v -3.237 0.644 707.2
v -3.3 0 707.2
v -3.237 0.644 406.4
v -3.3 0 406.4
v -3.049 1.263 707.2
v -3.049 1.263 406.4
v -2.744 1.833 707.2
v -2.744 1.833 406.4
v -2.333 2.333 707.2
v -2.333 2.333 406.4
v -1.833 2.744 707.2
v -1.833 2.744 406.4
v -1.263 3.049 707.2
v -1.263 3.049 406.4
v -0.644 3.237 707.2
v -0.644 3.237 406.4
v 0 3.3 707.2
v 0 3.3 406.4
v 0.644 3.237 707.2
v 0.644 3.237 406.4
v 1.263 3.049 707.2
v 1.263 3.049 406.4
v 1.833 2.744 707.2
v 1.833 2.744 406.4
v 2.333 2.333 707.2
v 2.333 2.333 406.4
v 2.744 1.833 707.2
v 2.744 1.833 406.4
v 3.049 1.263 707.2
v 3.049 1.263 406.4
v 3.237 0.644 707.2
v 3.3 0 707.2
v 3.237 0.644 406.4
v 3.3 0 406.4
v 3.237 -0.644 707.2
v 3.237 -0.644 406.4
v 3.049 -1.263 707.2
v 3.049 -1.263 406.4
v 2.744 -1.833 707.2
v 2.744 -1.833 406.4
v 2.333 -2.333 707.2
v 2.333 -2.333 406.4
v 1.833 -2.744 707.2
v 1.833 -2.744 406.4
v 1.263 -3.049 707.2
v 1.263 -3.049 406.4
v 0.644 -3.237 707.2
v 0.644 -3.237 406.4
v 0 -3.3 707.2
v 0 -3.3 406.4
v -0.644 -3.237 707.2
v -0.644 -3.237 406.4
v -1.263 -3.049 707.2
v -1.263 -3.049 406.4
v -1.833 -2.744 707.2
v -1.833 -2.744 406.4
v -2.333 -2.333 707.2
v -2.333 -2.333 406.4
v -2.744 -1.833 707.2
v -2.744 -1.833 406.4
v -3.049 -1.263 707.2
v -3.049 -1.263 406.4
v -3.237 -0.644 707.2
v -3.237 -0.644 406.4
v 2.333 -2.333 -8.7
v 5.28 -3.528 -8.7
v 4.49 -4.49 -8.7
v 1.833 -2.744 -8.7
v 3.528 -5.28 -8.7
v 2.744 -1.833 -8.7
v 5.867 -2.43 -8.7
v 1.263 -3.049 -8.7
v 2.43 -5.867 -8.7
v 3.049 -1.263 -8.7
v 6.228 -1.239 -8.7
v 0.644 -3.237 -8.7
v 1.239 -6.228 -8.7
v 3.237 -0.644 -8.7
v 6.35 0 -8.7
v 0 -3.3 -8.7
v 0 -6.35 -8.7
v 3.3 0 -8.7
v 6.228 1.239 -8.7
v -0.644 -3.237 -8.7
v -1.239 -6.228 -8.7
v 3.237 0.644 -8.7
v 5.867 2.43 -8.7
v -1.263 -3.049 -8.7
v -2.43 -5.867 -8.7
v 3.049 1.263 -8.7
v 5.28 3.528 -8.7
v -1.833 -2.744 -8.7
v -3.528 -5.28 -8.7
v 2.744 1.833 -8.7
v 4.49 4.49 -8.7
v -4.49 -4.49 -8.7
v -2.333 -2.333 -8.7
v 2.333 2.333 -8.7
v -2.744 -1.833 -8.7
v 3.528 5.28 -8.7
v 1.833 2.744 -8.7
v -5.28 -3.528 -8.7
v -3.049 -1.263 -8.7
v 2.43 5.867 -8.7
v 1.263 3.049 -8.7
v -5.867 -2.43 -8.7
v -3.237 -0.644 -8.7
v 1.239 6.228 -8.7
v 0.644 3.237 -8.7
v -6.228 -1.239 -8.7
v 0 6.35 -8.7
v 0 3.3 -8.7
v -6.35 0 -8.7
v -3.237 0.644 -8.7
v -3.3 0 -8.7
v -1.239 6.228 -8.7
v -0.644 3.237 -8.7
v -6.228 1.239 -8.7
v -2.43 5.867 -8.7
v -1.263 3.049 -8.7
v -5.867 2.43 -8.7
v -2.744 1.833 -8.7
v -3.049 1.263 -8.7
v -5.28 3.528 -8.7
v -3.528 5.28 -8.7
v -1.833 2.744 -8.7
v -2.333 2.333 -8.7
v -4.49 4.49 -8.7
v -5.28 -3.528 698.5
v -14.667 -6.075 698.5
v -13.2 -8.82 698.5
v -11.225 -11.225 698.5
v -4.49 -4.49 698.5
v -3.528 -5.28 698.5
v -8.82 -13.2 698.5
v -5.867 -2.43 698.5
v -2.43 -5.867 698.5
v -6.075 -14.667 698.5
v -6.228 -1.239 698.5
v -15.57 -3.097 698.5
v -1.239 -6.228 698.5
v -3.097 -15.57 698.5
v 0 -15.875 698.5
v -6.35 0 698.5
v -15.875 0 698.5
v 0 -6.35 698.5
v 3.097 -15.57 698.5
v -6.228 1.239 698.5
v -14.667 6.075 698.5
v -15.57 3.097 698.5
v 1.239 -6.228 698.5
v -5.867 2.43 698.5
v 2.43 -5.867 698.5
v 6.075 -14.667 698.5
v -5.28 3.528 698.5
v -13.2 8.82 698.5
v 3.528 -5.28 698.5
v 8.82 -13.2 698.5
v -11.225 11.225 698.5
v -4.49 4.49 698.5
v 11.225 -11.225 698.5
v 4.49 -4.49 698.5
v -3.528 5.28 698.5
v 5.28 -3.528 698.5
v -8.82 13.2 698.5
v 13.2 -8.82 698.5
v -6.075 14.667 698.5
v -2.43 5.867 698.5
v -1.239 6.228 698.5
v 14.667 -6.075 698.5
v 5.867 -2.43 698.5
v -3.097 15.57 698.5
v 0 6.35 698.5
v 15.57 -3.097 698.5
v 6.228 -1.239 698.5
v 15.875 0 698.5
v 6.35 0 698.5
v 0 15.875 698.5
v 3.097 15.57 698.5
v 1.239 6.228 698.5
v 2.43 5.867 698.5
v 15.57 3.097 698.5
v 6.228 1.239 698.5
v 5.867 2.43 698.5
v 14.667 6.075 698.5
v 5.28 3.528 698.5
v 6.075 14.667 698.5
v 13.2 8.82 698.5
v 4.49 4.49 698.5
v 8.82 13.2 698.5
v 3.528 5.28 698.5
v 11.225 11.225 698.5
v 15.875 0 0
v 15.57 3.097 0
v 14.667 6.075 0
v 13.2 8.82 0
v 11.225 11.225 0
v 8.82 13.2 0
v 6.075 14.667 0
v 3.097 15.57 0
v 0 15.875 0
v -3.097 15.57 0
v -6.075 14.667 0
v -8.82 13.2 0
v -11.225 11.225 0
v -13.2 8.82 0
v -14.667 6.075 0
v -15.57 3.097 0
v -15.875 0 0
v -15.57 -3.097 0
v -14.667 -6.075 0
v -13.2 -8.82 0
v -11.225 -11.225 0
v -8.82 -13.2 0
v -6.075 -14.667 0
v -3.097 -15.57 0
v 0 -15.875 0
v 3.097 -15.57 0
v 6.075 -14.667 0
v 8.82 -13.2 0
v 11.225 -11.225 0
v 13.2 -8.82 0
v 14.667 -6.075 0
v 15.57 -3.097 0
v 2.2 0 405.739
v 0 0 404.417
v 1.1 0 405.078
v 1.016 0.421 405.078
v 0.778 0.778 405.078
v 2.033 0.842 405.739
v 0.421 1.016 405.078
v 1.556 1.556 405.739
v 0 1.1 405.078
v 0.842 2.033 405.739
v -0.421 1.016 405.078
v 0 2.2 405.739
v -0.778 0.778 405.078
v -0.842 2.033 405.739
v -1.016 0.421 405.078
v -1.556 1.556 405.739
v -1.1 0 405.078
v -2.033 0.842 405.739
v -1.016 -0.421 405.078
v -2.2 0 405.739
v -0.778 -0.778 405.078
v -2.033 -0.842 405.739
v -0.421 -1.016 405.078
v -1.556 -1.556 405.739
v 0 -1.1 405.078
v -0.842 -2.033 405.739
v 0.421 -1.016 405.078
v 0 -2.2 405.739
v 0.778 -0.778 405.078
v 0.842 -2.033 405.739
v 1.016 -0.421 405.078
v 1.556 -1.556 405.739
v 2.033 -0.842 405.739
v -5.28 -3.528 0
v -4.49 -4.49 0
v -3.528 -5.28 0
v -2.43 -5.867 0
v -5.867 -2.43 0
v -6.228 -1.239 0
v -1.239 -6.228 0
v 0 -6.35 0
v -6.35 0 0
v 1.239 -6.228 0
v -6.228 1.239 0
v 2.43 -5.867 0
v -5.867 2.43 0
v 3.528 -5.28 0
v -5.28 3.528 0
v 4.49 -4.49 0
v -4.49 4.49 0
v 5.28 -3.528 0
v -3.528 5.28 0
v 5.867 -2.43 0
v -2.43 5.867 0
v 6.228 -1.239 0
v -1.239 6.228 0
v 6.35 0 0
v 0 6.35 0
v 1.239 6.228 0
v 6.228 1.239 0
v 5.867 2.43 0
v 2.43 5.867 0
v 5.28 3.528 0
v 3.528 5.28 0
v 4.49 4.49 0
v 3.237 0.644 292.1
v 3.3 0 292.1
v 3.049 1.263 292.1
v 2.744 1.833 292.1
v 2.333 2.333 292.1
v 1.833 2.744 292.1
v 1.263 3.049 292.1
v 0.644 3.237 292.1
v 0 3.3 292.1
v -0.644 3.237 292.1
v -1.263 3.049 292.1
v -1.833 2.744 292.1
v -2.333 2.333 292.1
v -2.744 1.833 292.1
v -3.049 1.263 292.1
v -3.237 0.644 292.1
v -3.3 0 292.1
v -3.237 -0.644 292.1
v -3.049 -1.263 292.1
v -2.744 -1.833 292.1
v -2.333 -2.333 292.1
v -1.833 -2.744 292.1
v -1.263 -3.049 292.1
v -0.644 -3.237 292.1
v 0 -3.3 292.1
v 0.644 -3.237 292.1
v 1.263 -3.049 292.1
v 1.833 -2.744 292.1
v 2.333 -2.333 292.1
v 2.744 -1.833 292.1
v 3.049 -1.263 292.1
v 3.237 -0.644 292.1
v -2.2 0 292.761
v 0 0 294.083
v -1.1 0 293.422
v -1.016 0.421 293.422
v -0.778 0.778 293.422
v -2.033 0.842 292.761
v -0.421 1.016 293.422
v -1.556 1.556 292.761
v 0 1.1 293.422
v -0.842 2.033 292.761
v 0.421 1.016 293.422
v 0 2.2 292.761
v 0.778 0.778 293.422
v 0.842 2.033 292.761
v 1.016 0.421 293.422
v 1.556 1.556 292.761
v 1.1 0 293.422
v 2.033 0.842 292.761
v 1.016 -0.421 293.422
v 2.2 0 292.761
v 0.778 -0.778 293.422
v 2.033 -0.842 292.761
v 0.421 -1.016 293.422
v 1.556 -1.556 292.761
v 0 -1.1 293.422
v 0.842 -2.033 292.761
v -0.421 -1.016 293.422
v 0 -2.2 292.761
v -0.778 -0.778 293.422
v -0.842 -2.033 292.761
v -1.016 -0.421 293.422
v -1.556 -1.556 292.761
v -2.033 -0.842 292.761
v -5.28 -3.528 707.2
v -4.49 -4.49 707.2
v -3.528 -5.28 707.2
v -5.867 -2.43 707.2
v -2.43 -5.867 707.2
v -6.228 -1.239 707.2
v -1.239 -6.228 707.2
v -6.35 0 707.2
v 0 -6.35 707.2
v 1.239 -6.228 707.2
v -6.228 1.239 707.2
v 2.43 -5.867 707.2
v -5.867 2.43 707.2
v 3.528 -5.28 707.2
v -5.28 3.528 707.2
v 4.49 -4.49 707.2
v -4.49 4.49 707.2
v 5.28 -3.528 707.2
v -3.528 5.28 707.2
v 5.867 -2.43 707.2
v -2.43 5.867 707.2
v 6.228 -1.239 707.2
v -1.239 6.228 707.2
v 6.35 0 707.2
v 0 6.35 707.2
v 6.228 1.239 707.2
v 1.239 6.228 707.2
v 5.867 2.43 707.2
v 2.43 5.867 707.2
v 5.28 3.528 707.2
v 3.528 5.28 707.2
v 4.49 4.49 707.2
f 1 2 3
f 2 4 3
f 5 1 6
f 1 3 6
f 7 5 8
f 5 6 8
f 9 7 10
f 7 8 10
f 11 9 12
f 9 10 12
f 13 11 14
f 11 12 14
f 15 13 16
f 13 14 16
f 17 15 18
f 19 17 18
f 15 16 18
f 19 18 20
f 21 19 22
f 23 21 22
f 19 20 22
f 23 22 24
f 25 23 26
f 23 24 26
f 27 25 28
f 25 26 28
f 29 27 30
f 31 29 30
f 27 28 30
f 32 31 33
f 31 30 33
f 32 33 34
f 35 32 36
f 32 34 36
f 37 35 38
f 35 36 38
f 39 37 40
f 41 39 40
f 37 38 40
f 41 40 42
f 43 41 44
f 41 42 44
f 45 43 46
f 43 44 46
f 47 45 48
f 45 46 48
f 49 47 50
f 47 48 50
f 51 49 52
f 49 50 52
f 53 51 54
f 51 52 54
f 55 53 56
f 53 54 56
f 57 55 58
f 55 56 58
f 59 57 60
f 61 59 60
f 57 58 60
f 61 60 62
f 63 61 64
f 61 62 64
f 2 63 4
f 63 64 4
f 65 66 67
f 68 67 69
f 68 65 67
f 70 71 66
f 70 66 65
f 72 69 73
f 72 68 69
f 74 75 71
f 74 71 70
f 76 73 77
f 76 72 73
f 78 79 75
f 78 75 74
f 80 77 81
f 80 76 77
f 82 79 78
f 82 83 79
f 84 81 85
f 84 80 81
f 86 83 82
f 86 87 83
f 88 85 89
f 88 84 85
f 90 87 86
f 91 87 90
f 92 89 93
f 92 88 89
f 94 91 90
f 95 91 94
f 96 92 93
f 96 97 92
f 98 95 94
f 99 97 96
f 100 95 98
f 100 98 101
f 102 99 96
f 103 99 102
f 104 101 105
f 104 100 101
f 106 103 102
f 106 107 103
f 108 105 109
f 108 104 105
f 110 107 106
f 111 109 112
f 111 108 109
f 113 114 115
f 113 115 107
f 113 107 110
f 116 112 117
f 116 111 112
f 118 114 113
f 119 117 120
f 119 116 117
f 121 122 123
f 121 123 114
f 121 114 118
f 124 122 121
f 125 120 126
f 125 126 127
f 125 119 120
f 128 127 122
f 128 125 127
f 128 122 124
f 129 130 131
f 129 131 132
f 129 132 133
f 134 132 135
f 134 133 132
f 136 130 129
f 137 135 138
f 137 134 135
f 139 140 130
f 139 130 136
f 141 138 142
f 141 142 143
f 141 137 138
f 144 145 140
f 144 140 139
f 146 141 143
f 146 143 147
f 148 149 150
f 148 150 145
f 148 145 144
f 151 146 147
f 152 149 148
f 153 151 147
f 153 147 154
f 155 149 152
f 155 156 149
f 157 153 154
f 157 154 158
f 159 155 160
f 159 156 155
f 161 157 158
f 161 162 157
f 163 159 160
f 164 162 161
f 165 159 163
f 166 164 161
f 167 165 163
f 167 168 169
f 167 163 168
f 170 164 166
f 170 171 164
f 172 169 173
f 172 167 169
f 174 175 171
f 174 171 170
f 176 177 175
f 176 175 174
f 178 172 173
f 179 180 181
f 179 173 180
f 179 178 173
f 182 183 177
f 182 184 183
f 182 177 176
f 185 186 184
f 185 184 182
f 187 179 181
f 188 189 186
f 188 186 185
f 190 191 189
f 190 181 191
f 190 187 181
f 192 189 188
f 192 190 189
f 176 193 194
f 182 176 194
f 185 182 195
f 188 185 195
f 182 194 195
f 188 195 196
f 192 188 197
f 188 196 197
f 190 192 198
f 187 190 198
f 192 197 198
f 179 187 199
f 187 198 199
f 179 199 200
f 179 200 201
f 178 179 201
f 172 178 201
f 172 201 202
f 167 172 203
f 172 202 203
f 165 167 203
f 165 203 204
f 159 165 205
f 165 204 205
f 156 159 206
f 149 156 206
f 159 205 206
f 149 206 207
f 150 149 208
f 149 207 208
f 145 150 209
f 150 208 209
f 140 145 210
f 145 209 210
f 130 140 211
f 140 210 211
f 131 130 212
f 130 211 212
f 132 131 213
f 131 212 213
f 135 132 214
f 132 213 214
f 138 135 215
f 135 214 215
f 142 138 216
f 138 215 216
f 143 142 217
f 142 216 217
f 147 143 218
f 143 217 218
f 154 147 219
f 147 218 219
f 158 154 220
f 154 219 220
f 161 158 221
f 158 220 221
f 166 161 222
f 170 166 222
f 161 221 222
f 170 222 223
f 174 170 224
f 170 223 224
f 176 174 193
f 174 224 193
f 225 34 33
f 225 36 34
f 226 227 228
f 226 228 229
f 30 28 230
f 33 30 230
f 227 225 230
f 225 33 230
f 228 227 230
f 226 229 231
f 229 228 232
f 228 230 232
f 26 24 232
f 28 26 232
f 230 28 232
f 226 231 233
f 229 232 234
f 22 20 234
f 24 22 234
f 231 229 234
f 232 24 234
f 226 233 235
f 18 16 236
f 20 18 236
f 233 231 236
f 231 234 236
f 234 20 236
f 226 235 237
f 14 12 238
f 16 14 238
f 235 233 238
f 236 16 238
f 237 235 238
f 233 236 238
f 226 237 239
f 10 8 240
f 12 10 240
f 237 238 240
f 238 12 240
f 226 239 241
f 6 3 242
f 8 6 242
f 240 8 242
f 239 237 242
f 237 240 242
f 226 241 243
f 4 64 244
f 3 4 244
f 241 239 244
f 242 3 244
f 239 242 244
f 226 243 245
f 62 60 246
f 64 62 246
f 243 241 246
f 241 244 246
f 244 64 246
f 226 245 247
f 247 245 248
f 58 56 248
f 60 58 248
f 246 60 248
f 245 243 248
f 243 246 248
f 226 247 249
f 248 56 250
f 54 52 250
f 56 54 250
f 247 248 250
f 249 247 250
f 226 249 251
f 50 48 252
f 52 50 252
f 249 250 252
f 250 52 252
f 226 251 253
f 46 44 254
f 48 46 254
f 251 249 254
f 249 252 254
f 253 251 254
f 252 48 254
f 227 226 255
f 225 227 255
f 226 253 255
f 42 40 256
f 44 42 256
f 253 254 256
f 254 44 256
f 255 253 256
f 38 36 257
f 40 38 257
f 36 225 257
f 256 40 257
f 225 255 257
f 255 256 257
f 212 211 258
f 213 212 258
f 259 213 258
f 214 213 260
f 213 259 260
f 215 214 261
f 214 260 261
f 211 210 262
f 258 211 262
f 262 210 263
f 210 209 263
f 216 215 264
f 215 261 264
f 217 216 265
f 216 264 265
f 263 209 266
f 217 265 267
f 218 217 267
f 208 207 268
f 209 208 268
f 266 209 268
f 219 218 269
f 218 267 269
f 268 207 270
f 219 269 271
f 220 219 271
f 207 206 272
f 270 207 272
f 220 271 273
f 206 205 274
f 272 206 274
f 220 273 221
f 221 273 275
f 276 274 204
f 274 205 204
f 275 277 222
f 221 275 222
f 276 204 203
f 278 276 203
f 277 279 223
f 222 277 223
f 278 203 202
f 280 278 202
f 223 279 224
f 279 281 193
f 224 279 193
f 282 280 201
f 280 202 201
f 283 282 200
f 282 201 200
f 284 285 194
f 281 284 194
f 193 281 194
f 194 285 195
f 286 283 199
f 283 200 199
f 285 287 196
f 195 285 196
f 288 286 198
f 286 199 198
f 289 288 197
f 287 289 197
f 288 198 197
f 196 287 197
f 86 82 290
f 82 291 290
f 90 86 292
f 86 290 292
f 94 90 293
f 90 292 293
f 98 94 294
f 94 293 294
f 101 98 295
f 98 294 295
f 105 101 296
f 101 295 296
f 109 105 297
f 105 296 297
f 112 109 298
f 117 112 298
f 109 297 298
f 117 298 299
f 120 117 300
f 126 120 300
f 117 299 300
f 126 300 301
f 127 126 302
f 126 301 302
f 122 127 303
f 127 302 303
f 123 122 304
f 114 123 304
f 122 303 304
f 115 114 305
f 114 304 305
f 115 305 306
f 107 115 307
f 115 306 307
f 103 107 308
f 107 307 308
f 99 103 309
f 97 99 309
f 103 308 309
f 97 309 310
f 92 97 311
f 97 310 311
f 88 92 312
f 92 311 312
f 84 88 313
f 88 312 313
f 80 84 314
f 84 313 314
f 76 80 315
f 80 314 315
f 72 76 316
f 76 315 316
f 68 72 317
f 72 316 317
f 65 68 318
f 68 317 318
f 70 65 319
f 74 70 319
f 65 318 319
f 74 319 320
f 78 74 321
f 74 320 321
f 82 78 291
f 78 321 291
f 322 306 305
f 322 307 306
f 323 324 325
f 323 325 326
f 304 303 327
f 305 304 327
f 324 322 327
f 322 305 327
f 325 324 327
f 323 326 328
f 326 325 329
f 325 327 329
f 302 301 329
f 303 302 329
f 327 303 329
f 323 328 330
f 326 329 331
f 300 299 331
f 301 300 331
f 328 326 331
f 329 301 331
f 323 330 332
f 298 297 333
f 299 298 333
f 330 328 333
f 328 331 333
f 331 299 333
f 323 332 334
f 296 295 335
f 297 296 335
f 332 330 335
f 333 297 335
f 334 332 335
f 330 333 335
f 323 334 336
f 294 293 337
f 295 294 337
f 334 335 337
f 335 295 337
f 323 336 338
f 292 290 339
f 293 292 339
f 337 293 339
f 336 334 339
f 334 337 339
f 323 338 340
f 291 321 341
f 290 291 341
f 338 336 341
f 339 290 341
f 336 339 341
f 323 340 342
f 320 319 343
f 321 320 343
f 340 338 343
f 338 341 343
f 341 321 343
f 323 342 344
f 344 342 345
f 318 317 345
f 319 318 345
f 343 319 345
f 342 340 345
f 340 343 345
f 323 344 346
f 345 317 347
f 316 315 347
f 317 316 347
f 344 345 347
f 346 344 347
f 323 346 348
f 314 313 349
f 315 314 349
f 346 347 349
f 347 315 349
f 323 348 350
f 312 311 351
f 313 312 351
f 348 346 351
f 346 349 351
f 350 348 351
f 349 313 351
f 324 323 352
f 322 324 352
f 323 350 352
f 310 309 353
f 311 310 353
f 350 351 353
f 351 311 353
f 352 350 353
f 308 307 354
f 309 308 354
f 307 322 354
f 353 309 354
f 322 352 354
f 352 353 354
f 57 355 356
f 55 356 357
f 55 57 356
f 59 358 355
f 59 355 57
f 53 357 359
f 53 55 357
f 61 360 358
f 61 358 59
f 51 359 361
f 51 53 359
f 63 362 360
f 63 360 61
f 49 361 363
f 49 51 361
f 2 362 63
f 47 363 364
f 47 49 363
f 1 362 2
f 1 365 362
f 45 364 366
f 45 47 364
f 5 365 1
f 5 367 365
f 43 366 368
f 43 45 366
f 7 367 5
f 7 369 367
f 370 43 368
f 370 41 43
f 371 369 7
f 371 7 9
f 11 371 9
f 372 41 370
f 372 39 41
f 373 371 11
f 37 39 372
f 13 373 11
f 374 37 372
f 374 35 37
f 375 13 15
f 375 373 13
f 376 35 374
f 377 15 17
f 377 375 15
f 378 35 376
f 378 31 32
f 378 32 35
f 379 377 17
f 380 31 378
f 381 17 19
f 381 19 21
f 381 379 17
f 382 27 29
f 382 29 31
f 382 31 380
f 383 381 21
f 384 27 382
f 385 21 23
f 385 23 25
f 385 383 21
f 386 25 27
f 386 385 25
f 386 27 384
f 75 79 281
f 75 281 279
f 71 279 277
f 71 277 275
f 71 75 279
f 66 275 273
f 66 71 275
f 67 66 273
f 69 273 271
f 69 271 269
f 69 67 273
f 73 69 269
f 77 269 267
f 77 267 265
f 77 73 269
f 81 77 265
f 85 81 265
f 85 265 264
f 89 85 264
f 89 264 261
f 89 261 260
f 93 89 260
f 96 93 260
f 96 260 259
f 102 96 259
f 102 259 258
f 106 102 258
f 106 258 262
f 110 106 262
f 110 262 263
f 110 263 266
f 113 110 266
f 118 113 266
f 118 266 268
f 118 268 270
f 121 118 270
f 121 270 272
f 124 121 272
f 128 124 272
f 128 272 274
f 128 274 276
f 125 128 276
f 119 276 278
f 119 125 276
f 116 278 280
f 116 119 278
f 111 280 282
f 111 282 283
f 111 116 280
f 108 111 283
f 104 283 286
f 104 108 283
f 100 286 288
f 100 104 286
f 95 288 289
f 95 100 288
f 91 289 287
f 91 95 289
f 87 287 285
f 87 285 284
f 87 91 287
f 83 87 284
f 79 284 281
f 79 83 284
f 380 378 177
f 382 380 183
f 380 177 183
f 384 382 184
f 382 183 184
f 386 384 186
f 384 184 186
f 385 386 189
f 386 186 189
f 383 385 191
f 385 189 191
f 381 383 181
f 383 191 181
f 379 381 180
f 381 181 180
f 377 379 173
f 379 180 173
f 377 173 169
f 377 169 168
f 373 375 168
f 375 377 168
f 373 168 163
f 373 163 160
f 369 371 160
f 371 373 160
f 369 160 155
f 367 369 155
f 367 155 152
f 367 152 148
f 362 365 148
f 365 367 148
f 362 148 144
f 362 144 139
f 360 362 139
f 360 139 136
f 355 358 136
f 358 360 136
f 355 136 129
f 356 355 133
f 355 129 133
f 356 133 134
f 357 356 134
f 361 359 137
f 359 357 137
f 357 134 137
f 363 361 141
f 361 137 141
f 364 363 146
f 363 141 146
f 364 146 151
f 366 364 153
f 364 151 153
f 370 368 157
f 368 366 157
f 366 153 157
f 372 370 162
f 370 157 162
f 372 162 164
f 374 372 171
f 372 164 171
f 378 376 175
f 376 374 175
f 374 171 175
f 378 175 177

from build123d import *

# Parameters (mm, degrees)
SKETCH1_R                          = 15.875
BOSS_EXTRUDE1_DEPTH                = 698.5
SKETCH2_R                          = 6.35
BOSS_EXTRUDE2_DEPTH                = 12.7
BOSS_EXTRUDE3_START                = 12.7
SKETCH3_R                          = 6.35
BOSS_EXTRUDE3_DEPTH                = 12.7
CBORE_FOR_M6_HEX_HEAD1_D           = 6.6
CBORE_FOR_M6_HEX_HEAD1_DEPTH       = 304.8
CBORE_FOR_M6_HEX_HEAD1_CBORE_D     = 14.547
CBORE_FOR_M6_HEX_HEAD1_CBORE_DEPTH = 4
CBORE_FOR_M6_HEX_HEAD1_TIP         = 1.982840043
CBORE_FOR_M6_HEX_HEAD4_D           = 6.6
CBORE_FOR_M6_HEX_HEAD4_DEPTH       = 304.8
CBORE_FOR_M6_HEX_HEAD4_CBORE_D     = 14.547
CBORE_FOR_M6_HEX_HEAD4_CBORE_DEPTH = 4
CBORE_FOR_M6_HEX_HEAD4_TIP         = 1.982840043


with BuildPart() as part:
    # Sketch1 → Boss-Extrude1 (new body)
    with BuildSketch(Plane.XY):
        Circle(SKETCH1_R)
    extrude(amount=BOSS_EXTRUDE1_DEPTH)

    # Sketch2 → Boss-Extrude2 (add)
    with BuildSketch(Plane.XY.offset(698.5)):
        Circle(SKETCH2_R)
    extrude(amount=BOSS_EXTRUDE2_DEPTH)

    # Sketch3 → Boss-Extrude3 (add)
    with BuildSketch(Plane(origin=(0, 0, 0), x_dir=(-1, 0, 0), z_dir=(0, 0, -1)).offset(BOSS_EXTRUDE3_START)):
        with Locations(Location((0, 0, 0), (0, 0, 180))):
            Circle(SKETCH3_R)
    extrude(amount=-BOSS_EXTRUDE3_DEPTH)

    # CBORE for M6 Hex Head1
    with Locations(Plane.XY.offset(711.2)):
        with Locations((0, 0)):
            CounterBoreHole(CBORE_FOR_M6_HEX_HEAD1_D / 2, CBORE_FOR_M6_HEX_HEAD1_CBORE_D / 2, CBORE_FOR_M6_HEX_HEAD1_CBORE_DEPTH, depth=CBORE_FOR_M6_HEX_HEAD1_DEPTH)
            with Locations((0, 0, -(CBORE_FOR_M6_HEX_HEAD1_DEPTH + CBORE_FOR_M6_HEX_HEAD1_TIP / 2))):  # 118° drill point
                Cone(0, CBORE_FOR_M6_HEX_HEAD1_D / 2, CBORE_FOR_M6_HEX_HEAD1_TIP, mode=Mode.SUBTRACT)

    # CBORE for M6 Hex Head4
    with Locations(Plane(origin=(0, 0, -12.7), x_dir=(-1, 0, 0), z_dir=(0, 0, -1))):
        with Locations((0, 0)):
            CounterBoreHole(CBORE_FOR_M6_HEX_HEAD4_D / 2, CBORE_FOR_M6_HEX_HEAD4_CBORE_D / 2, CBORE_FOR_M6_HEX_HEAD4_CBORE_DEPTH, depth=CBORE_FOR_M6_HEX_HEAD4_DEPTH)
            with Locations((0, 0, -(CBORE_FOR_M6_HEX_HEAD4_DEPTH + CBORE_FOR_M6_HEX_HEAD4_TIP / 2))):  # 118° drill point
                Cone(0, CBORE_FOR_M6_HEX_HEAD4_D / 2, CBORE_FOR_M6_HEX_HEAD4_TIP, mode=Mode.SUBTRACT)


solid = part.part
